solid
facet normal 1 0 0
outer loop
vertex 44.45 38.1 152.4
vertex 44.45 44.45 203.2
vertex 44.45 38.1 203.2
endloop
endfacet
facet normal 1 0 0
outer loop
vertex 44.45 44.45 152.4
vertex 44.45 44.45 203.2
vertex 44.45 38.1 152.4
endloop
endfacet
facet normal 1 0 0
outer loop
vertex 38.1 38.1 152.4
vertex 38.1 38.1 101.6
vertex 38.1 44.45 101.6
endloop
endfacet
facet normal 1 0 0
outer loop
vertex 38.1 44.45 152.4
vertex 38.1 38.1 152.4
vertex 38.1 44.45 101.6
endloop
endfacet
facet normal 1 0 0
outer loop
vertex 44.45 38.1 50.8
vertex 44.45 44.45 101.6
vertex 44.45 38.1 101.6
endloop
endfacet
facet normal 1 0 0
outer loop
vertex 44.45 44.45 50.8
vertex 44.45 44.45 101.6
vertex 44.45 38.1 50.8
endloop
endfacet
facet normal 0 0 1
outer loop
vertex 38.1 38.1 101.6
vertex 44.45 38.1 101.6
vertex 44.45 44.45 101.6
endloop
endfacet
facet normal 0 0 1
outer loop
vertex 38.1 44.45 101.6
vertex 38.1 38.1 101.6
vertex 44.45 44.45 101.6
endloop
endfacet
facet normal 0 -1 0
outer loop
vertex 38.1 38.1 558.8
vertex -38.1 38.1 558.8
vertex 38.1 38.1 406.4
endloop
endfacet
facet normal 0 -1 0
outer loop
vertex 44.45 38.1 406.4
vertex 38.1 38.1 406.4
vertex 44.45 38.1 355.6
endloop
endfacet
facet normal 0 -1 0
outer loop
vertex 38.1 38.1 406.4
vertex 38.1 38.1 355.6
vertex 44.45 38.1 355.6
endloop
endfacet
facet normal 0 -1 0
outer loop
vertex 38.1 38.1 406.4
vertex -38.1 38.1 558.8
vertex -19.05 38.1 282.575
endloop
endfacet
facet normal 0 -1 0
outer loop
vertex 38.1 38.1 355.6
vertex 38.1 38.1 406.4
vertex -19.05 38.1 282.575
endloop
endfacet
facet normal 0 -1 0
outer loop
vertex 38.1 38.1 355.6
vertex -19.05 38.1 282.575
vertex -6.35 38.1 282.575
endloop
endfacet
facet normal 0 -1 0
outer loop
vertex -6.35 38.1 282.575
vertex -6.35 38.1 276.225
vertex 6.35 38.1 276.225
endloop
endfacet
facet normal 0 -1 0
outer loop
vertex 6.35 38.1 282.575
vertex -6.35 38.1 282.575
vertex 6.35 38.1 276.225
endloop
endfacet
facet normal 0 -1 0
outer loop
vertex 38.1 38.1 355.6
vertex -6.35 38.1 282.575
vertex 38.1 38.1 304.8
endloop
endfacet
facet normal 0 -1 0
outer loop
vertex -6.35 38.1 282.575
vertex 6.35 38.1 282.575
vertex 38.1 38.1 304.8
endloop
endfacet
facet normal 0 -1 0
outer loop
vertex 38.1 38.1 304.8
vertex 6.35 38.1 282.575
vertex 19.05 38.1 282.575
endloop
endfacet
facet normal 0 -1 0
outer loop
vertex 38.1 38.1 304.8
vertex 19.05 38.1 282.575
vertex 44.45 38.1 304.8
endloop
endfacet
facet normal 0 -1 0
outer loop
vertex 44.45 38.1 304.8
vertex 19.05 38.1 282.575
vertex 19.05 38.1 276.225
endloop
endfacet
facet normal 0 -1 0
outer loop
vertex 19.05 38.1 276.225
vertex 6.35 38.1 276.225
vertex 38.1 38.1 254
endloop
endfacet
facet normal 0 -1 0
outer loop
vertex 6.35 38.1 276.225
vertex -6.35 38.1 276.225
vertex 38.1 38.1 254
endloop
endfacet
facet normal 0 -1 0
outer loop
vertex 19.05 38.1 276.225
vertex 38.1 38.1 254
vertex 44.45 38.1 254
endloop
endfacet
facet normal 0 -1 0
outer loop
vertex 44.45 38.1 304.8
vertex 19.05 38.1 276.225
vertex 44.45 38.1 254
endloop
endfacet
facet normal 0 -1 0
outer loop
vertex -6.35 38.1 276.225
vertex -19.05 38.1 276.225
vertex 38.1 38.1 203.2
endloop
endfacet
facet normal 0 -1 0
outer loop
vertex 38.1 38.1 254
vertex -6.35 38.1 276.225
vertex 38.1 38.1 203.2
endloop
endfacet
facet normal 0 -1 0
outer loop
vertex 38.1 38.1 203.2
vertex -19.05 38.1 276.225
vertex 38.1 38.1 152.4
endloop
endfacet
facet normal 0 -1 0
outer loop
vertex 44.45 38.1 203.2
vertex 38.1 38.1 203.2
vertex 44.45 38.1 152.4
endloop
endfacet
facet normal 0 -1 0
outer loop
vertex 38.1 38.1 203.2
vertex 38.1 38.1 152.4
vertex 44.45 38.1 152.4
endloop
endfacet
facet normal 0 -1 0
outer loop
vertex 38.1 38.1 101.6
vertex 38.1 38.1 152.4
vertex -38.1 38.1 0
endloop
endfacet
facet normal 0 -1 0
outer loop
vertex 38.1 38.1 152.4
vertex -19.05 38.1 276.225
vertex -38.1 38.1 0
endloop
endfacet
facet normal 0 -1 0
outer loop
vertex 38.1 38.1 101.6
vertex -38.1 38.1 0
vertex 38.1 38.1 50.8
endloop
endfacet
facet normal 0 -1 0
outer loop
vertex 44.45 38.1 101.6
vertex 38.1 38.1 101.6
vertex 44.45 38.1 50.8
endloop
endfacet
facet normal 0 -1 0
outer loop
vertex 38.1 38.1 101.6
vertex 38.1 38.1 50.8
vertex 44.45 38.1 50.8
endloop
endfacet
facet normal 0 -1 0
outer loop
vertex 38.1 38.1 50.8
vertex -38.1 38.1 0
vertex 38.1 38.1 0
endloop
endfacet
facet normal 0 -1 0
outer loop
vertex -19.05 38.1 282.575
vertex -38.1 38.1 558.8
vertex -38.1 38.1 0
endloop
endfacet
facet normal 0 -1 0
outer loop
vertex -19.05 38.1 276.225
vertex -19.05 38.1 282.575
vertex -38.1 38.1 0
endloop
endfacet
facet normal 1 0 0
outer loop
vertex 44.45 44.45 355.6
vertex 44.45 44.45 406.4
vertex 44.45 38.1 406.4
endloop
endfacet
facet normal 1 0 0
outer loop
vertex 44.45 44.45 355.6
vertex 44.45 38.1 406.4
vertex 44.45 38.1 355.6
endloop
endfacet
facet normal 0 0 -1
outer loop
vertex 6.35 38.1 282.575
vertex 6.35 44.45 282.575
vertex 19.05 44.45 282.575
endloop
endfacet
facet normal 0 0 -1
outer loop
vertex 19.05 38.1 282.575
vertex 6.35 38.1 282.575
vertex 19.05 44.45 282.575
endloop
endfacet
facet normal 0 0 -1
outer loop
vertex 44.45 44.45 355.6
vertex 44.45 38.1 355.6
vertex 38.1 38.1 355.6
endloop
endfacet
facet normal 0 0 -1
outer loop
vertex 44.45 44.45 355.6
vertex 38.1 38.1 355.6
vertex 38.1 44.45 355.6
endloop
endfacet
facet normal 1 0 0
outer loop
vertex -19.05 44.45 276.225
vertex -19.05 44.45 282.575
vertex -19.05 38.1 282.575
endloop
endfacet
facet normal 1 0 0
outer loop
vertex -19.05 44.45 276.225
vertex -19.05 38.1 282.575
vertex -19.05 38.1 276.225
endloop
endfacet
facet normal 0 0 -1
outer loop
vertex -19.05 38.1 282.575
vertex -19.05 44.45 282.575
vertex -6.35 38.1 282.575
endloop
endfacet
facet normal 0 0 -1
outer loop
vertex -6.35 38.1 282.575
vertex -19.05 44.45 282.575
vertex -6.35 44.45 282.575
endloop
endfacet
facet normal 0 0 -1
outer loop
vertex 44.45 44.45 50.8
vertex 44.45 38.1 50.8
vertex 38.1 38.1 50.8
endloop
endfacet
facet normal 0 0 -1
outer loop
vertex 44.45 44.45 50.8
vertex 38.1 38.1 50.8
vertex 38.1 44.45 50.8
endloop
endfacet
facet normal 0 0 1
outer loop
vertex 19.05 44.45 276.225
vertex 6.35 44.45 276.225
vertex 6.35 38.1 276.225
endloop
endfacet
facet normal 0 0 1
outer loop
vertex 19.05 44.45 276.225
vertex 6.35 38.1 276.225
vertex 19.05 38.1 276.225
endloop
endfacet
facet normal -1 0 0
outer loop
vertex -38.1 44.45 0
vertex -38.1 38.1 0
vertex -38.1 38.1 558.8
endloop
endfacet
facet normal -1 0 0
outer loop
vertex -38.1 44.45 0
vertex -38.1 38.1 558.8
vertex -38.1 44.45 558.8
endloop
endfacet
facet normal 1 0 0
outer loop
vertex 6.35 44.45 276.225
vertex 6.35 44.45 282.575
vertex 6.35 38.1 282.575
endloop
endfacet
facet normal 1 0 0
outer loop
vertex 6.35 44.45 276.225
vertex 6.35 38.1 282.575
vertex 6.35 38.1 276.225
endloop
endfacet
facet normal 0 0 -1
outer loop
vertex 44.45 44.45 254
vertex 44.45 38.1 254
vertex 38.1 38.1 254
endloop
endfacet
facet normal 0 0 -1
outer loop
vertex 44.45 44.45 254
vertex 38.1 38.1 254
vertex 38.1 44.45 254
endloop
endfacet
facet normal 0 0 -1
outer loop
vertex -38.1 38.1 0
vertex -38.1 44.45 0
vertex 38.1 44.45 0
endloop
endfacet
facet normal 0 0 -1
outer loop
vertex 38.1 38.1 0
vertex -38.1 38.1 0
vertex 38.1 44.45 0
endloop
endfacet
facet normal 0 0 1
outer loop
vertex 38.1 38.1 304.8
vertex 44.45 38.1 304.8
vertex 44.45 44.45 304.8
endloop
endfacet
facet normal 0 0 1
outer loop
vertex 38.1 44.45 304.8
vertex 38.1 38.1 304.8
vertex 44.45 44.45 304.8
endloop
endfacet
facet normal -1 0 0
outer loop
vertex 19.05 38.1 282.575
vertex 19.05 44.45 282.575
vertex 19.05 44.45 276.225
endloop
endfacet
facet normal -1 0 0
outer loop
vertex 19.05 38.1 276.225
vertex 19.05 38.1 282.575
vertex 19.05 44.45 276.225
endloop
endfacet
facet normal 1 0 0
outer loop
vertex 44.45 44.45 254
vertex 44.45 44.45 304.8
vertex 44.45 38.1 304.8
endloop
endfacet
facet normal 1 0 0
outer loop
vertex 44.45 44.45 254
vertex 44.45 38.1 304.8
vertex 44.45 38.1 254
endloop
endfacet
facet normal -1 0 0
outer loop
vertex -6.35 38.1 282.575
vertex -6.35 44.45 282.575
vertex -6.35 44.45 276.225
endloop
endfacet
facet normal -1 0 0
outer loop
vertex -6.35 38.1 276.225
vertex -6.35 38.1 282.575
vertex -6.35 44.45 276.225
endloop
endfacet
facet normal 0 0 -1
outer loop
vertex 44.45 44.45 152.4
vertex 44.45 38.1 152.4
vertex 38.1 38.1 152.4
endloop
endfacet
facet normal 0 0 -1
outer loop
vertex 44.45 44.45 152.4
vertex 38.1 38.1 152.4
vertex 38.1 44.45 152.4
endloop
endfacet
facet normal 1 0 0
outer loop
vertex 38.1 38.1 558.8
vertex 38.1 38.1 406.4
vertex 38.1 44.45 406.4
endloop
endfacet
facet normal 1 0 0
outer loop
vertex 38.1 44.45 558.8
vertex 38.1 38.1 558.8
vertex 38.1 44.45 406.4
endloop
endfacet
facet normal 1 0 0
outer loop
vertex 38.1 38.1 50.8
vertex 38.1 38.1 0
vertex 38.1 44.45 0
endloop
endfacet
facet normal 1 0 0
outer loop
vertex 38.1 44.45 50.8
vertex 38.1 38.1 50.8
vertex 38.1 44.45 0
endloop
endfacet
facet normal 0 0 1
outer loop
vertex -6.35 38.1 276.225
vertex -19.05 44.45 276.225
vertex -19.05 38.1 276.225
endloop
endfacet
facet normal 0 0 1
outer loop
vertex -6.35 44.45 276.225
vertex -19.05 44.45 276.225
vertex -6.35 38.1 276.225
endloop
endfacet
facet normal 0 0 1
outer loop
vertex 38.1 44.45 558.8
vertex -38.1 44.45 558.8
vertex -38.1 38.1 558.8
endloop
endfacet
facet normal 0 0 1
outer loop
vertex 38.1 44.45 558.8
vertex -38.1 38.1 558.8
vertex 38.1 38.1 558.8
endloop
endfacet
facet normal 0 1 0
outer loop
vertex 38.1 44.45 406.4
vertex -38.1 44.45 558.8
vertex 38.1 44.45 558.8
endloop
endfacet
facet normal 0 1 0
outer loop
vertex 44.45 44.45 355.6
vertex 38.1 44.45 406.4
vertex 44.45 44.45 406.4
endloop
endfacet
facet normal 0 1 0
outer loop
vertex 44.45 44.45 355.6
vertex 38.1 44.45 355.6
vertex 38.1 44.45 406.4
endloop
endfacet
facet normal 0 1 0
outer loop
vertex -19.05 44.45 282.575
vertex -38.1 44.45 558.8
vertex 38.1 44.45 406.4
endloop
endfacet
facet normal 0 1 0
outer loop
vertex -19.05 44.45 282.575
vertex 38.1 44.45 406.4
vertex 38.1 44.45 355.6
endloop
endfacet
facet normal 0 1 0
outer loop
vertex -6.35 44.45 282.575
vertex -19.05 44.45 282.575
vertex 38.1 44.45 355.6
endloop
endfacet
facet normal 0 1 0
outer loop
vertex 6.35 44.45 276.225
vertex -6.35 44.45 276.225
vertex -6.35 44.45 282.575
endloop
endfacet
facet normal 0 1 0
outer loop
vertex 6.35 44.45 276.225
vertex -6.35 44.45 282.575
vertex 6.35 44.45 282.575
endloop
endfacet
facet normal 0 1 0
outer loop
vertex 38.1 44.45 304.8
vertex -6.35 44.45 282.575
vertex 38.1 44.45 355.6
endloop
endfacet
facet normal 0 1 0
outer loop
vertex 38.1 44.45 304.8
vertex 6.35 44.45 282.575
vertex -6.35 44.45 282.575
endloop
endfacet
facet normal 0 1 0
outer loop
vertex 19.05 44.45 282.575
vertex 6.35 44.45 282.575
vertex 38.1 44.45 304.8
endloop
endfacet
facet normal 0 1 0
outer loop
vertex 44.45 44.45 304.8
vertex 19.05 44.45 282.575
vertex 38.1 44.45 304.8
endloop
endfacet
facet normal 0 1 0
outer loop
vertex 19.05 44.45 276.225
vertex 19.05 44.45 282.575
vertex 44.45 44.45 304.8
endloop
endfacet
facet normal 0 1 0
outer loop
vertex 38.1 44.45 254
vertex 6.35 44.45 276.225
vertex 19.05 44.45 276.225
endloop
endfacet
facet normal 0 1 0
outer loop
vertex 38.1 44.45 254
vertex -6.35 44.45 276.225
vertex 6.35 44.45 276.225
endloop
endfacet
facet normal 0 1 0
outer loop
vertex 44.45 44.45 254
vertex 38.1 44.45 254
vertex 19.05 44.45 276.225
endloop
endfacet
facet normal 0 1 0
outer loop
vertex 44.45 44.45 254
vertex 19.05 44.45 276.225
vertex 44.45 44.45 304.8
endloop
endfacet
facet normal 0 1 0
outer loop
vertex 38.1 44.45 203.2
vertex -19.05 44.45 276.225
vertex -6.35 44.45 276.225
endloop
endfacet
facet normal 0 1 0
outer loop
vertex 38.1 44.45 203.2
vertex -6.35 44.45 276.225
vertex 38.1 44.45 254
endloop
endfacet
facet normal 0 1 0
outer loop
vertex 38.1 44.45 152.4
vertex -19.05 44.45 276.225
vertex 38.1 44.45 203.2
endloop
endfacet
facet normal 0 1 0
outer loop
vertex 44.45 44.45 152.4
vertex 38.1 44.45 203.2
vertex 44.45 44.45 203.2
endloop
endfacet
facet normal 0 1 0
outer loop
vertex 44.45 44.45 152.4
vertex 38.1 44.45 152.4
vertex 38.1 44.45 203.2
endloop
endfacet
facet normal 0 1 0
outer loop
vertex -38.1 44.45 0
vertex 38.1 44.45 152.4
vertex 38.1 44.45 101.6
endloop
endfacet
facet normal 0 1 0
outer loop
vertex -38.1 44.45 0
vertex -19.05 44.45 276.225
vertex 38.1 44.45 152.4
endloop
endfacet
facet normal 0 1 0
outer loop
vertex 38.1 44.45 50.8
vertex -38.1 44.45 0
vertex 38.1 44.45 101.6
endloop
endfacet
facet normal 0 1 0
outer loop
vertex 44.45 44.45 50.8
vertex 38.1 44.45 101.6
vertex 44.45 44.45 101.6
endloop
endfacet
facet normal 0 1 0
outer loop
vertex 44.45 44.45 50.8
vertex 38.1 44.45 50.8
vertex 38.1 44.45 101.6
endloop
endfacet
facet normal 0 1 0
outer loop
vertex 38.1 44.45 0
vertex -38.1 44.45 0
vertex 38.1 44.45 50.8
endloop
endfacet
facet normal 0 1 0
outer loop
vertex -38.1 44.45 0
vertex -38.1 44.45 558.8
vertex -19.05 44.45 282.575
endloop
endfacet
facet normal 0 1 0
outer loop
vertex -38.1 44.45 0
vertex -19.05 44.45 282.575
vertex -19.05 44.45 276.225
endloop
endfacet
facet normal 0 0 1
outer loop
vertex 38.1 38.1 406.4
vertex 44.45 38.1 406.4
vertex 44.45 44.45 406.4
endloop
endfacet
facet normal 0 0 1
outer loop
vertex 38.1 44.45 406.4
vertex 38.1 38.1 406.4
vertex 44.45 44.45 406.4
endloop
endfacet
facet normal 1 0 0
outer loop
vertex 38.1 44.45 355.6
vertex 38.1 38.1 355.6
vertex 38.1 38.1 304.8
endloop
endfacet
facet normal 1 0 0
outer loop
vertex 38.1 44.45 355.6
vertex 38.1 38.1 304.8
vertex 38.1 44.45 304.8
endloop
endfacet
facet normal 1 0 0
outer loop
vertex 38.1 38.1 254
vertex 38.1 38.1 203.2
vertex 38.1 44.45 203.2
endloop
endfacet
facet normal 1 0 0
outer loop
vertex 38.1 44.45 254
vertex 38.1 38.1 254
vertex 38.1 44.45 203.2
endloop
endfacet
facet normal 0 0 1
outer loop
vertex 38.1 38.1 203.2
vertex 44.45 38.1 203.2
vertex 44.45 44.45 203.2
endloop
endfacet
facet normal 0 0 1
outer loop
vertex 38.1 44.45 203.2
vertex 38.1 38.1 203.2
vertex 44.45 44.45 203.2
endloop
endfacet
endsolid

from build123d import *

# Parameters (mm, degrees)
SKETCH1_W           = 76.2
SKETCH1_H           = 6.35
BOSS_EXTRUDE1_DEPTH = 558.8
SKETCH2_W           = 12.7
SKETCH2_H           = 6.35
CUT_EXTRUDE1_DEPTH  = 561.133352426
SKETCH3_W           = 50.8
SKETCH3_H           = 6.35
BOSS_EXTRUDE2_DEPTH = 6.35


with BuildPart() as part:
    # Sketch1 → Boss-Extrude1 (new body)
    with BuildSketch(Plane.XY):
        with Locations((0, 41.275)):
            Rectangle(SKETCH1_W, SKETCH1_H)
    extrude(amount=BOSS_EXTRUDE1_DEPTH)

    # Sketch2 → Cut-Extrude1 (cut, through all)
    with BuildSketch(Plane(origin=(0, 44.45, 0), x_dir=(1, 0, 0), z_dir=(0, 1, 0))):
        with Locations((12.7, -279.4)):
            Rectangle(SKETCH2_W, SKETCH2_H)
        with Locations((-12.7, -279.4)):
            Rectangle(SKETCH2_W, SKETCH2_H)
    extrude(amount=-CUT_EXTRUDE1_DEPTH, mode=Mode.SUBTRACT)

    # Sketch3 → Boss-Extrude2 (add)
    with BuildSketch(Plane(origin=(38.1, 0, 0), x_dir=(0, 0, -1), z_dir=(1, 0, 0))):
        with Locations((-381, 41.275)):
            Rectangle(SKETCH3_W, SKETCH3_H)
        with Locations((-279.4, 41.275)):
            Rectangle(SKETCH3_W, SKETCH3_H)
        with Locations((-177.8, 41.275)):
            Rectangle(SKETCH3_W, SKETCH3_H)
        with Locations((-76.2, 41.275)):
            Rectangle(SKETCH3_W, SKETCH3_H)
    extrude(amount=BOSS_EXTRUDE2_DEPTH)


solid = part.part
